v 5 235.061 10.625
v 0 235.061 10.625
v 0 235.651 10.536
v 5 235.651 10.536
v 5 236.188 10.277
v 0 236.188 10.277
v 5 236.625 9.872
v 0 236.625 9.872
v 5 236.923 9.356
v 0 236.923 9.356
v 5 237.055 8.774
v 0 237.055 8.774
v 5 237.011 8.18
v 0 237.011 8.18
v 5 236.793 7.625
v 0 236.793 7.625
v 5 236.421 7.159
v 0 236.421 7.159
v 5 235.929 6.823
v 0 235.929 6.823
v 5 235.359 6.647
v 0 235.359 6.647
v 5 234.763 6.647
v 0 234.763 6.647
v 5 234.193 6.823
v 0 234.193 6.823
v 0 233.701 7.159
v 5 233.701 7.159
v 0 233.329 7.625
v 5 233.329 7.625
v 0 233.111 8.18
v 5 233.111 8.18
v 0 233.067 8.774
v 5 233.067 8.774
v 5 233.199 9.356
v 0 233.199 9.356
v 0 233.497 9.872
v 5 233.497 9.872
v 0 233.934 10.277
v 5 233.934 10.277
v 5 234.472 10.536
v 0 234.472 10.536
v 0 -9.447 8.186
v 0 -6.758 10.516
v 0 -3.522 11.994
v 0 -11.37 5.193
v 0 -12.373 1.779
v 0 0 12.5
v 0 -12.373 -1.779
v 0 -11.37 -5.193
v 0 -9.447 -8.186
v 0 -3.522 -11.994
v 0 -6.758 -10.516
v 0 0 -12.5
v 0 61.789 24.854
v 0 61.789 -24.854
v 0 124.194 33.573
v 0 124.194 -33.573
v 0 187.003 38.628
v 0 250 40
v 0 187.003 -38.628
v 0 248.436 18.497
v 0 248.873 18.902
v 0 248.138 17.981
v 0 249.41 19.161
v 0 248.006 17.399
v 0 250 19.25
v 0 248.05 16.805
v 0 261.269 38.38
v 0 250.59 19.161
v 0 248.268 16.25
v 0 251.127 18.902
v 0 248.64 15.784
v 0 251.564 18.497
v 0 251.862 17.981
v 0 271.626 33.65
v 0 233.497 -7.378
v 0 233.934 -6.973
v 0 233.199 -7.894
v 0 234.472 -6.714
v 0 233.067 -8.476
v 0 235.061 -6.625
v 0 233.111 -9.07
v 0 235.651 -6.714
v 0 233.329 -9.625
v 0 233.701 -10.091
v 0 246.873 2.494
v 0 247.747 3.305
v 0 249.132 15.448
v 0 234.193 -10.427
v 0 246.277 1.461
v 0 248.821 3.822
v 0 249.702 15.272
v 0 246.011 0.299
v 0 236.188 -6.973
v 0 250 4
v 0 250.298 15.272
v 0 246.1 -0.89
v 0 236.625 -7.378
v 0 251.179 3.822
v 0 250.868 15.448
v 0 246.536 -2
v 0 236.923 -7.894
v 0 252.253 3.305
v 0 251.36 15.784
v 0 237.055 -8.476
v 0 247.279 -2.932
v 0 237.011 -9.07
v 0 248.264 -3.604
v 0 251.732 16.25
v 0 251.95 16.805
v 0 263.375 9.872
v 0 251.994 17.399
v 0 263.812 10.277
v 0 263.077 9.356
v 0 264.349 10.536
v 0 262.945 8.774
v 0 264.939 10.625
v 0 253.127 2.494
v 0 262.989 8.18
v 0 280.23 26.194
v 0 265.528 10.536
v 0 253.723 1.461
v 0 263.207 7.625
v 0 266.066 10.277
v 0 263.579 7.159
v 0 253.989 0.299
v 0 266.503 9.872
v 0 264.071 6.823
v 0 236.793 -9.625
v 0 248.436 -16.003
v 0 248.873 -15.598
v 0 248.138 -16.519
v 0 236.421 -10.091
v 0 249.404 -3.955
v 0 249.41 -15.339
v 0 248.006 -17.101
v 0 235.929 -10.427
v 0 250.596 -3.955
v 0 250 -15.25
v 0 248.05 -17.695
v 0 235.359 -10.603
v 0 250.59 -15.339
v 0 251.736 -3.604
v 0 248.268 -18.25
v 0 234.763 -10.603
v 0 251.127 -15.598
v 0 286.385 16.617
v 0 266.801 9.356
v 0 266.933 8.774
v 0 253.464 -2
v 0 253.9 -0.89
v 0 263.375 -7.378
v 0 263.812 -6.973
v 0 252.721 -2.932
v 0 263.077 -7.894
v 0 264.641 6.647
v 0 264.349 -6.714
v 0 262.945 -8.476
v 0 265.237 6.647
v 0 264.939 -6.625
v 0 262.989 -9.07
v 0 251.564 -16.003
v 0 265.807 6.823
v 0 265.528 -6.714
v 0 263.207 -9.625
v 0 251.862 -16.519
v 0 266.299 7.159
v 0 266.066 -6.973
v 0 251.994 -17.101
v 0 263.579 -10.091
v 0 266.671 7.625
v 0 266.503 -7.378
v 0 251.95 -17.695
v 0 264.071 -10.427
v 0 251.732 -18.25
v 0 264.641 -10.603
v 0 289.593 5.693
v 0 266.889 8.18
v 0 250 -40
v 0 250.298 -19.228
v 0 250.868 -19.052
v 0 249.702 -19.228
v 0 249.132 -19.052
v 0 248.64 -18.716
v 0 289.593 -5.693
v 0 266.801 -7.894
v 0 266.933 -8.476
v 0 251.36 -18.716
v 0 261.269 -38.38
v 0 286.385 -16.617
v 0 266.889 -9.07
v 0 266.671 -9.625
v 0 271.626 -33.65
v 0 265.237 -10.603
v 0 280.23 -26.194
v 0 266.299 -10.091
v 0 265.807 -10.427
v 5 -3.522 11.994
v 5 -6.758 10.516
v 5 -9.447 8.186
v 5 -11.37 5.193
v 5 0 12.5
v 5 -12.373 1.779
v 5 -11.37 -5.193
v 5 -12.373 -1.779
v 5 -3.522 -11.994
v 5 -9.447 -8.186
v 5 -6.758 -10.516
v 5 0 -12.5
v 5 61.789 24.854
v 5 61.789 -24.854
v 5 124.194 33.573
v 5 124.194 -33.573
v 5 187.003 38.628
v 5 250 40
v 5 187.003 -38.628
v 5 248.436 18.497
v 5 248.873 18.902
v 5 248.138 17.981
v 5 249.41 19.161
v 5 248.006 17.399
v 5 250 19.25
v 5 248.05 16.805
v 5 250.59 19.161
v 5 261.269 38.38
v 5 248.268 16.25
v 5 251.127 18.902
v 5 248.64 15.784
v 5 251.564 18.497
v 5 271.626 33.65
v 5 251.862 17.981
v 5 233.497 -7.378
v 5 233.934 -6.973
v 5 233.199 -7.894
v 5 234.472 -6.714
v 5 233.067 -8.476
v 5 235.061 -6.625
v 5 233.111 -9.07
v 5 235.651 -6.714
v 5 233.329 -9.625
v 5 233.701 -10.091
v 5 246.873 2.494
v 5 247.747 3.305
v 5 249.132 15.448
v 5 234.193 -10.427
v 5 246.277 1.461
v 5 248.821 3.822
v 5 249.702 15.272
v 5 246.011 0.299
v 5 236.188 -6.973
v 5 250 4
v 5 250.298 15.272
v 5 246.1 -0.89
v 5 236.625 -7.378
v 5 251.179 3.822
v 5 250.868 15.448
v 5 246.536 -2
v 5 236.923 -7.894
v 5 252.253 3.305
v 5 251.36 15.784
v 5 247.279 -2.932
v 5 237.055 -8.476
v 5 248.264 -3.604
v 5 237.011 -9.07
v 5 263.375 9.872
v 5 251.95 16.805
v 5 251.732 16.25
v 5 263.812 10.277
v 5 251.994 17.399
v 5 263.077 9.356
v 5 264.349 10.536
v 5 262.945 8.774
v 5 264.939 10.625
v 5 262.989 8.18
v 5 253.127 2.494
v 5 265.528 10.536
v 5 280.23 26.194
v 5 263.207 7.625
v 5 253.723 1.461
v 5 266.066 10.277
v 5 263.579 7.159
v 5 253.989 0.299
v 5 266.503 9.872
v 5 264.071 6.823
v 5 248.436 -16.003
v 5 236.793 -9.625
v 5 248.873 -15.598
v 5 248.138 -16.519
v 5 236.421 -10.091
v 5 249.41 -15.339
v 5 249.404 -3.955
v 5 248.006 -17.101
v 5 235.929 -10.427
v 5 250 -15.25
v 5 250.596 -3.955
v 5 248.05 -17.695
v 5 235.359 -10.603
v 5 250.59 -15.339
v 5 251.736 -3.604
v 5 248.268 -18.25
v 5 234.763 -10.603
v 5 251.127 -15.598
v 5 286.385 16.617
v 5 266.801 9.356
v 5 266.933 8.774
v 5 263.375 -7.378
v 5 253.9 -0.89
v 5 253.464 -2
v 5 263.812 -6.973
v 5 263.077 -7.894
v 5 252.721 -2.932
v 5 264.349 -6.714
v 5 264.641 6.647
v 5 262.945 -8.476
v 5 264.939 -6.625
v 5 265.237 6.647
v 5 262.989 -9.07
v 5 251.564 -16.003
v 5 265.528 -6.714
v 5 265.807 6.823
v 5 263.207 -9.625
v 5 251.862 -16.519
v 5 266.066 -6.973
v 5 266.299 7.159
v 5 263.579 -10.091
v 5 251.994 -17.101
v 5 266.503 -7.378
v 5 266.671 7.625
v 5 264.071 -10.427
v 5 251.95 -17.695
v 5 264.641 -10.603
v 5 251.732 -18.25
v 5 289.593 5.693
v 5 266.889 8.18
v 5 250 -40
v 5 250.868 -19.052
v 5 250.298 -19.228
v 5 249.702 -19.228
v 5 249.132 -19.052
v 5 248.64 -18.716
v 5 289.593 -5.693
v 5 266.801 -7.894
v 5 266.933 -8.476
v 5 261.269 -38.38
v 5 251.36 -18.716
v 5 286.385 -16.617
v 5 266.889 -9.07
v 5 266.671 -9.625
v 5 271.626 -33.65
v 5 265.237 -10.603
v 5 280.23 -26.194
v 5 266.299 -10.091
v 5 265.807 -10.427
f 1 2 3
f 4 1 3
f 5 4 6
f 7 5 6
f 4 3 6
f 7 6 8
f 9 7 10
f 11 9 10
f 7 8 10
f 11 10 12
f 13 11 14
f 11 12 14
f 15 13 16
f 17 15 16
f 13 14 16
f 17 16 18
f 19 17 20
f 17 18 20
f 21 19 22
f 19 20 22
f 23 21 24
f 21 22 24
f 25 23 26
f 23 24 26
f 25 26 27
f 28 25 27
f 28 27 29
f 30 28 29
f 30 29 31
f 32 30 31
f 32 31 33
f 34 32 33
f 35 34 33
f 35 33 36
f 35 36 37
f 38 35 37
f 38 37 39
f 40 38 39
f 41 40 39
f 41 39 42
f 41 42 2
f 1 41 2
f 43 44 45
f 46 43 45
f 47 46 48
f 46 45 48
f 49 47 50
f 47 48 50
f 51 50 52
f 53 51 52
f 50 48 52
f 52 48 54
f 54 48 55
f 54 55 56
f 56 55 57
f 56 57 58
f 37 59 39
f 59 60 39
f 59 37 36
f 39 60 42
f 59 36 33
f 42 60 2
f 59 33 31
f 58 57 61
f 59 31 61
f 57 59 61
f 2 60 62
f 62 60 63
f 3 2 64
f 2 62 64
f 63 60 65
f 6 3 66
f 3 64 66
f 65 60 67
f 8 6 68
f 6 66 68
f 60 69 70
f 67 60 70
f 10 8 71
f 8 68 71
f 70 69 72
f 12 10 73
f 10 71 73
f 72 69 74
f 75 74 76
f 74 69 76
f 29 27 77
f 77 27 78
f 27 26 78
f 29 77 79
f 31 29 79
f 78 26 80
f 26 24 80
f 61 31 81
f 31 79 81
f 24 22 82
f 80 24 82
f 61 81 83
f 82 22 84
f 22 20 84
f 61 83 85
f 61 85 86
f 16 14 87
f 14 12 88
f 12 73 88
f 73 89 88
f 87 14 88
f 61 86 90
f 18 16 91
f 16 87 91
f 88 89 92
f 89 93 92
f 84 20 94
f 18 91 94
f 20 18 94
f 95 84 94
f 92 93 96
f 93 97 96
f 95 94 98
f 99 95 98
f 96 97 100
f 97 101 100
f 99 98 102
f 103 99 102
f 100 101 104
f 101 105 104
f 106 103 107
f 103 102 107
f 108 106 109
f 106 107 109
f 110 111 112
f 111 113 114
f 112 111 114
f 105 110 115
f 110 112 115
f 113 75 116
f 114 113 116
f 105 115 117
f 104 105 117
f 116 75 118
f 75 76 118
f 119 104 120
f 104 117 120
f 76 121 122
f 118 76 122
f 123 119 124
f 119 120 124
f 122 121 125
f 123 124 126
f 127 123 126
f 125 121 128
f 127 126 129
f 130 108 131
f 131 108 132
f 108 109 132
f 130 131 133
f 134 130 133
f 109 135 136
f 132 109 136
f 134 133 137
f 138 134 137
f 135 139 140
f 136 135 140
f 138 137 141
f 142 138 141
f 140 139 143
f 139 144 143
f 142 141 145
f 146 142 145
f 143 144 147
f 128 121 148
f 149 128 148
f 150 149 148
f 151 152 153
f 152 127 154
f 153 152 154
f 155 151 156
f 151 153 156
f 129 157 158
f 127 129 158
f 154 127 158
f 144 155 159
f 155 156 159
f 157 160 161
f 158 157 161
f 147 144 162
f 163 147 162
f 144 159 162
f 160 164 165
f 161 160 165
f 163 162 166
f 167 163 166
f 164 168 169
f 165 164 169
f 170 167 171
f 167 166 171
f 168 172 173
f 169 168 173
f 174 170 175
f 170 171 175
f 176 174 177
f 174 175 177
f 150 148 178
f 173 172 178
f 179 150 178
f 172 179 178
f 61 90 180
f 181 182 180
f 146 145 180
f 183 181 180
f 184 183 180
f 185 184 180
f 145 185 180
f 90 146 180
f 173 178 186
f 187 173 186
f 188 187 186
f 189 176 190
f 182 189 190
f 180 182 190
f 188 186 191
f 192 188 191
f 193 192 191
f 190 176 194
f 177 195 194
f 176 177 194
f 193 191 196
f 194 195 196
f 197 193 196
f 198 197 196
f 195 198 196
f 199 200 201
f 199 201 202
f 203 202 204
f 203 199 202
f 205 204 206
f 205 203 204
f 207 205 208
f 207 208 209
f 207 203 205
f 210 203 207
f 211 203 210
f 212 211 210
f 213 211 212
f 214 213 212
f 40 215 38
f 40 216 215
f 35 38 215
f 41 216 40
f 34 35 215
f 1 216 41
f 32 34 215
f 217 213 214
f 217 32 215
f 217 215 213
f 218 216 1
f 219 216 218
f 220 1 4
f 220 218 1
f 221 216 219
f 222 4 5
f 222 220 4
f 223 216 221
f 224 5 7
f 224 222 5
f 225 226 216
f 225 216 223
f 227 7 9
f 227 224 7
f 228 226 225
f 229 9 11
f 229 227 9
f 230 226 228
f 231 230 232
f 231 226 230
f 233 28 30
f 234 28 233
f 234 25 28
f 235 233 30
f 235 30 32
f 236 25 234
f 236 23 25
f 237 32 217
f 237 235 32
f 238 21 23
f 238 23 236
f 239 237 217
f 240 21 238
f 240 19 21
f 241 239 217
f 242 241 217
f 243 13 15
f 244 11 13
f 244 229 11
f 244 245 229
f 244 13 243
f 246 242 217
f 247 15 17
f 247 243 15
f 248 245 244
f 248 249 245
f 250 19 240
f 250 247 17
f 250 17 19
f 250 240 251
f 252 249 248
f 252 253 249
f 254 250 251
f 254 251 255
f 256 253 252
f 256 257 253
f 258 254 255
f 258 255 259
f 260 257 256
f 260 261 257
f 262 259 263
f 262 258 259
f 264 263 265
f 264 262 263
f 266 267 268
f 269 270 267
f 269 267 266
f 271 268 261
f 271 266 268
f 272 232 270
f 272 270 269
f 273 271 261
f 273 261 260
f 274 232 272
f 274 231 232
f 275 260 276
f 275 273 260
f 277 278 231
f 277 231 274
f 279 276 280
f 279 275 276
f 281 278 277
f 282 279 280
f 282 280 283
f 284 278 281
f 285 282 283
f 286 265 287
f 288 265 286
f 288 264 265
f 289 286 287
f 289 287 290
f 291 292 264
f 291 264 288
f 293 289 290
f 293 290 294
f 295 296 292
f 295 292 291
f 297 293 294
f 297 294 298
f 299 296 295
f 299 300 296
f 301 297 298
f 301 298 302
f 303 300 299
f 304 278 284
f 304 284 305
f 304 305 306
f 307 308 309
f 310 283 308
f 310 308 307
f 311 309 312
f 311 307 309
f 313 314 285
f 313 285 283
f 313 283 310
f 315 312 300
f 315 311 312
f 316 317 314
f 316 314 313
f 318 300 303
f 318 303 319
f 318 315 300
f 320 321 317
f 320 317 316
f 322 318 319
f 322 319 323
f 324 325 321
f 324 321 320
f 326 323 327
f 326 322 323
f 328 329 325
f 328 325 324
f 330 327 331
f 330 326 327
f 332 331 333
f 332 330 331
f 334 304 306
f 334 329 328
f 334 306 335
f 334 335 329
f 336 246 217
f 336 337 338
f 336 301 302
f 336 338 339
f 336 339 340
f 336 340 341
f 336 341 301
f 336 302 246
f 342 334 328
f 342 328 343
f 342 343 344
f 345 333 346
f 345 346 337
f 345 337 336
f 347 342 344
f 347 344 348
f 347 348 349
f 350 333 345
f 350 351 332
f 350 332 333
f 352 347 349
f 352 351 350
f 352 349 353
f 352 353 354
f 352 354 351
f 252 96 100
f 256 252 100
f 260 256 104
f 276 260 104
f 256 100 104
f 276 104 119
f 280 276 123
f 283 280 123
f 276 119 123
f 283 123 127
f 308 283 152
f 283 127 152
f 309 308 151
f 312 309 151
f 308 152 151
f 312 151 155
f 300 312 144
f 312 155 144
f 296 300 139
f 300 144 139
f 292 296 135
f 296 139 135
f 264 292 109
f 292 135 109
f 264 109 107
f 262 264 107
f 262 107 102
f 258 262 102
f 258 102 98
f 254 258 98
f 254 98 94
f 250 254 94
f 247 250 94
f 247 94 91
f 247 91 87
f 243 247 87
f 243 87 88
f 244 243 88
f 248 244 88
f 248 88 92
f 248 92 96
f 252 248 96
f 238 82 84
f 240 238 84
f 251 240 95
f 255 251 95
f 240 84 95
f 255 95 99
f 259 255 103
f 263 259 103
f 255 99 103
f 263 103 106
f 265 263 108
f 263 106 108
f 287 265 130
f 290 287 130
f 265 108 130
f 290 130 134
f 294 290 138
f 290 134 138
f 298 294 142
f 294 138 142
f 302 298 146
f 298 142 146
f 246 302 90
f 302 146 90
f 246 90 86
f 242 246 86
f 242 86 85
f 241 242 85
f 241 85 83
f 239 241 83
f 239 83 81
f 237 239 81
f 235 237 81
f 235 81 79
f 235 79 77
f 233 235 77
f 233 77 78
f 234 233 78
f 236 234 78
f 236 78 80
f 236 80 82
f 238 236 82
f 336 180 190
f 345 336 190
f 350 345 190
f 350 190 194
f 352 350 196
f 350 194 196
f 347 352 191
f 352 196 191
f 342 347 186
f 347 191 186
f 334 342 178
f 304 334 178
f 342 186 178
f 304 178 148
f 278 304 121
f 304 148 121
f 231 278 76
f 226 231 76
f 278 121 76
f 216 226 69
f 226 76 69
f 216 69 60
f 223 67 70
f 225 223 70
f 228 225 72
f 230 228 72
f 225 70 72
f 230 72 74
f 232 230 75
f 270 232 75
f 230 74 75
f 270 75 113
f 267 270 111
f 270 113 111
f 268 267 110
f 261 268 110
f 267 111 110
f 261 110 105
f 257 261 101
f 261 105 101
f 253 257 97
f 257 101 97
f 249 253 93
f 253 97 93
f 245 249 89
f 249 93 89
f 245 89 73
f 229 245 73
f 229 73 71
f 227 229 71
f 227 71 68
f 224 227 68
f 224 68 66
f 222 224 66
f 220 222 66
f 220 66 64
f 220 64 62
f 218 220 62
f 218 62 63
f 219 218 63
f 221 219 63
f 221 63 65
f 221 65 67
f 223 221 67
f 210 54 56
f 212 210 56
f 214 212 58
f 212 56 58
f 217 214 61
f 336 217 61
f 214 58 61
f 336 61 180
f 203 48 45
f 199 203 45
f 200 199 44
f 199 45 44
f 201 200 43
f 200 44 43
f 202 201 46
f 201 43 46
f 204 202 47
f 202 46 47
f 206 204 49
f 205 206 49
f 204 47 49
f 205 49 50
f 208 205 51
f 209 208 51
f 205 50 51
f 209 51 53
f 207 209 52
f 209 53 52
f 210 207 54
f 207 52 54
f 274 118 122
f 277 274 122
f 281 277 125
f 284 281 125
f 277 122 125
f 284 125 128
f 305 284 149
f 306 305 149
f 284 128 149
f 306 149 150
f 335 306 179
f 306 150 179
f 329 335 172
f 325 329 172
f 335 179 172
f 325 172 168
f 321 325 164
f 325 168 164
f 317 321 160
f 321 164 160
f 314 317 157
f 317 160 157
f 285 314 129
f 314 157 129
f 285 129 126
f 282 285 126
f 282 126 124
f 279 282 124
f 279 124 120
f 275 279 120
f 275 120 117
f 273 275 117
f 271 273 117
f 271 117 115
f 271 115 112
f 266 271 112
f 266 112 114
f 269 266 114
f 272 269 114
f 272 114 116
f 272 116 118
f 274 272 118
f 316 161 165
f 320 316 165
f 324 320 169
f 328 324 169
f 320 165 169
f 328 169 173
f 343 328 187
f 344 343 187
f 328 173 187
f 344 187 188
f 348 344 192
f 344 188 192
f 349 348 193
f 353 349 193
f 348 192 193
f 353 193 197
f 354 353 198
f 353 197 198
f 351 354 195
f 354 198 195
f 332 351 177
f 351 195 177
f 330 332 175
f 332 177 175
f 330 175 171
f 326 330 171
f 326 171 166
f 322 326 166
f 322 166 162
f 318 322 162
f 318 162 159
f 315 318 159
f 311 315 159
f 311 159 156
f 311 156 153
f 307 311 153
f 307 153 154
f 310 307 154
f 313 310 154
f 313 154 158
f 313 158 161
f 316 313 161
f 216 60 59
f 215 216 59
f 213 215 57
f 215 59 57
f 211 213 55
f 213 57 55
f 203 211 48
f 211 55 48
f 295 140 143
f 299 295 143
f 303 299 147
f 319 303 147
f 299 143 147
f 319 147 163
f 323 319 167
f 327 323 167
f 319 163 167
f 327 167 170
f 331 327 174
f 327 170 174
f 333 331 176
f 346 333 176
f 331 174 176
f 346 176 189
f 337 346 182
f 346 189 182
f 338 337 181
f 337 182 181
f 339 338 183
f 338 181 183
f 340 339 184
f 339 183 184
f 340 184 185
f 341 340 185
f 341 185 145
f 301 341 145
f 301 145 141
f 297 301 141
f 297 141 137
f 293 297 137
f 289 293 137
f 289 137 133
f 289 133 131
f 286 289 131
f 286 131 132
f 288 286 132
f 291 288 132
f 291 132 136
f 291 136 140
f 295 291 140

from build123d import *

# Parameters (mm, degrees)
EXTRUDE_1_DEPTH     = 5
SKETCH_2_R          = 2
SKETCH_2_R_2        = 4
CUT_EXTRUDE_1_DEPTH = 293.792434527


with BuildPart() as part:
    # 草图1 → 凸台-拉伸1 (new body)
    with BuildSketch(Plane(origin=(0, 0, 0), x_dir=(0, 0, -1), z_dir=(1, 0, 0))):
        with BuildLine():
            ThreePointArc((-12.5, 0), (0, -12.5), (12.5, 0))
            ThreePointArc((12.5, 0), (33.57319831, 124.194448186), (40, 250))
            ThreePointArc((40, 250), (0, 290), (-40, 250))
            ThreePointArc((-40, 250), (-33.57319831, 124.194448186), (-12.5, 0))
        make_face()
    extrude(amount=EXTRUDE_1_DEPTH)

    # 草图2 → 切除-拉伸1 (cut, through all)
    with BuildSketch(Plane.ZY):
        with Locations((17.25, 250)):
            Circle(SKETCH_2_R)
        with Locations((8.625, 235.061061785)):
            Circle(SKETCH_2_R)
        with Locations((-8.625, 235.061061785)):
            Circle(SKETCH_2_R)
        with Locations((-17.25, 250)):
            Circle(SKETCH_2_R)
        with Locations((-8.625, 264.938938215)):
            Circle(SKETCH_2_R)
        with Locations((8.625, 264.938938215)):
            Circle(SKETCH_2_R)
        with Locations((0, 250)):
            Circle(SKETCH_2_R_2)
    extrude(amount=-CUT_EXTRUDE_1_DEPTH, mode=Mode.SUBTRACT)


solid = part.part
